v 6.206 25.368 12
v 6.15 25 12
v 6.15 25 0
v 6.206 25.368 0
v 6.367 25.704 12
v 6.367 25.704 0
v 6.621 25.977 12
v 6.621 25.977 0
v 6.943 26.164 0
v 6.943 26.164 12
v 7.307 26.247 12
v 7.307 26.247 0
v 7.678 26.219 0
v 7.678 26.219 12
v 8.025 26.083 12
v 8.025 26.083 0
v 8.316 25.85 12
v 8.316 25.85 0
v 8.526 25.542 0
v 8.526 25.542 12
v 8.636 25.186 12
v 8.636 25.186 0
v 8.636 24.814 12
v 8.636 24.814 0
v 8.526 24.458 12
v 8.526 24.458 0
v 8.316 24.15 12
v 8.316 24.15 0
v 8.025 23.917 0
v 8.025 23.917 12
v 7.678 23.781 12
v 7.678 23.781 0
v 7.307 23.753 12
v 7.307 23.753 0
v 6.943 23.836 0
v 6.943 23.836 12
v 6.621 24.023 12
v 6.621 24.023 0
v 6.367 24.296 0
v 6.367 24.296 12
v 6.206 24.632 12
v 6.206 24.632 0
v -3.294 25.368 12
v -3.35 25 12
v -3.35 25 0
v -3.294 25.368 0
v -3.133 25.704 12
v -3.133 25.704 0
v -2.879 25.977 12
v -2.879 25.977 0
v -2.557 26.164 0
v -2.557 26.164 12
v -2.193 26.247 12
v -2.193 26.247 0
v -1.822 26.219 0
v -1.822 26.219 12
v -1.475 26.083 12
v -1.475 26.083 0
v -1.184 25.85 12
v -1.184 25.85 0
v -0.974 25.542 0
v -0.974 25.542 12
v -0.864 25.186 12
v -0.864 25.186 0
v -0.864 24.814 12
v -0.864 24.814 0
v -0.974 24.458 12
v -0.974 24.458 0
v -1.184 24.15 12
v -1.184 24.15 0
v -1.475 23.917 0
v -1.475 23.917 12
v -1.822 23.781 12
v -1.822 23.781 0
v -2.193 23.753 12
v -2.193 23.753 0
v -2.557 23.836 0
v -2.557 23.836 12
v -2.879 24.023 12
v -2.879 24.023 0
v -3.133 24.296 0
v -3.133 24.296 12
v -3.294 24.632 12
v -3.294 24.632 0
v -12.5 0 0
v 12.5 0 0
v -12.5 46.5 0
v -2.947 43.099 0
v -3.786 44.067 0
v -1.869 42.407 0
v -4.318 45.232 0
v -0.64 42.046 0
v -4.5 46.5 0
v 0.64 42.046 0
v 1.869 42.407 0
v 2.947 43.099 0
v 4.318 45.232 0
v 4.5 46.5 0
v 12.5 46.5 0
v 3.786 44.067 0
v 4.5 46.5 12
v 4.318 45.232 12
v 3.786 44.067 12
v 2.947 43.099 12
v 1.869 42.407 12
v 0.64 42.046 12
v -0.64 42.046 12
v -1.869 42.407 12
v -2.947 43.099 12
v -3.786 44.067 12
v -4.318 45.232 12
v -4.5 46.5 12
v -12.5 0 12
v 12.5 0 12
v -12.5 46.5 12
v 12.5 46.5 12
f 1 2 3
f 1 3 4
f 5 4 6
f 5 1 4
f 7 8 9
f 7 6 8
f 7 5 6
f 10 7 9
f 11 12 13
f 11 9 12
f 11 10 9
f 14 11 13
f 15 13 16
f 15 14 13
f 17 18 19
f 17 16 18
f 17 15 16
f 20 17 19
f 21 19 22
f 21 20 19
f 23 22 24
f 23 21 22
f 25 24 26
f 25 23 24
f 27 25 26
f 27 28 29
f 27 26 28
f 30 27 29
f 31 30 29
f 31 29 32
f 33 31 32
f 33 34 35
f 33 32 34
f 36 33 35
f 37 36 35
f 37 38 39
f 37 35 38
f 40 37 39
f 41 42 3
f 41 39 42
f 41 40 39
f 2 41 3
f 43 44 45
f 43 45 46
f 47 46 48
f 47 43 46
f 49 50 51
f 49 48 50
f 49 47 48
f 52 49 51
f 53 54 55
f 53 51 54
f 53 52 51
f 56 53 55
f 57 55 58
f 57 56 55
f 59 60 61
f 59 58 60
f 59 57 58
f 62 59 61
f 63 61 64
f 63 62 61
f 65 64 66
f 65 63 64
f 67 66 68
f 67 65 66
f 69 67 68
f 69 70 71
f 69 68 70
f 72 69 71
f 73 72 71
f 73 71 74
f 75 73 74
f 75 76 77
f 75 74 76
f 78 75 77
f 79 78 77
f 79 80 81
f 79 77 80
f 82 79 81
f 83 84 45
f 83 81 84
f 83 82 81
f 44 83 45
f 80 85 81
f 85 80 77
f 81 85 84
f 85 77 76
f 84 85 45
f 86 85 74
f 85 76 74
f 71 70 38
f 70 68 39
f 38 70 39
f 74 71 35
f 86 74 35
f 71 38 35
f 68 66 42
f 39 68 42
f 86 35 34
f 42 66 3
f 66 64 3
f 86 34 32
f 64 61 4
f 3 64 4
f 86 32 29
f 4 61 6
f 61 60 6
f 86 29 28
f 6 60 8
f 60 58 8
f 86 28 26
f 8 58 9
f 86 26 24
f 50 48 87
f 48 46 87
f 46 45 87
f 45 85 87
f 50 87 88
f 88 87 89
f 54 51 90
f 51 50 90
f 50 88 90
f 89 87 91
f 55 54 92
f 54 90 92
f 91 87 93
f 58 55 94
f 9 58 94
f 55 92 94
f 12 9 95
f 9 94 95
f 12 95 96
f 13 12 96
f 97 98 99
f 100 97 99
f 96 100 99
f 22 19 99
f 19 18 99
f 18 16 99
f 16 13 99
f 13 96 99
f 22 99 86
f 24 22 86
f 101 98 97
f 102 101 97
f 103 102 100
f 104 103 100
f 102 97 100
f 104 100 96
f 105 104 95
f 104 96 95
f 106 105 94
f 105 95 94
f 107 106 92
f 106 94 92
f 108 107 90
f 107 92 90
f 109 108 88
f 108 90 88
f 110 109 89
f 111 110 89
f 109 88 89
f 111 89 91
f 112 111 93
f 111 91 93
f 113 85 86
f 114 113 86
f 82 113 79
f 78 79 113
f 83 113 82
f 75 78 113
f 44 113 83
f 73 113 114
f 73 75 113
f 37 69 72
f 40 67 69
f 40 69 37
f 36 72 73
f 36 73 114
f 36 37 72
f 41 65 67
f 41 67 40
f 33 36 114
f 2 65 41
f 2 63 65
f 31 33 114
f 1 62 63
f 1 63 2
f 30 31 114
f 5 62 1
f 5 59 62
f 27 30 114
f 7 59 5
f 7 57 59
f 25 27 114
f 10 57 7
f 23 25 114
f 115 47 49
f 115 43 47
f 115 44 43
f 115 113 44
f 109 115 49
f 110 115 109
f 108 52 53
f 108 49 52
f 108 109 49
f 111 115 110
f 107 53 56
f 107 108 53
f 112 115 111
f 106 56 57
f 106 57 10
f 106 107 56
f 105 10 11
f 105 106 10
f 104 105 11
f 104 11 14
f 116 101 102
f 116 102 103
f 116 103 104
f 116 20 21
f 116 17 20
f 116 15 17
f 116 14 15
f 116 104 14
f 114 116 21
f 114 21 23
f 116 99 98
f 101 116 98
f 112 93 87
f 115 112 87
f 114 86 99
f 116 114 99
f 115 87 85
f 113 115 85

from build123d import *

# Parameters (mm, degrees)
BOSS_EXTRUDE1_DEPTH     = 12
CUT_EXTRUDE1_DEPTH      = 50.623583103
CUT_EXTRUDE1_DEPTH_BACK = 50.623583103
SKETCH2_R               = 1.25


with BuildPart() as part:
    # Sketch1 → Boss-Extrude1 (new body)
    with BuildSketch(Plane.XY):
        with BuildLine():
            Line((-12.5, 0), (12.5, 0))
            Line((12.5, 0), (12.5, 46.5))
            Line((12.5, 46.5), (4.5, 46.5))
            ThreePointArc((4.5, 46.5), (0, 42), (-4.5, 46.5))
            Line((-4.5, 46.5), (-12.5, 46.5))
            Line((-12.5, 46.5), (-12.5, 0))
        make_face()
    extrude(amount=BOSS_EXTRUDE1_DEPTH)

    # Sketch2 → Cut-Extrude1 (cut, two sides: drawn at the far end of the back side and taken through both)
    with BuildSketch(Plane(origin=(0, 0, 0), x_dir=(-1, 0, 0), z_dir=(0, 0, -1)).offset(-CUT_EXTRUDE1_DEPTH_BACK)):
        with Locations((-7.4, 25)):
            Circle(SKETCH2_R)
        with Locations((2.1, 25)):
            Circle(SKETCH2_R)
    extrude(amount=CUT_EXTRUDE1_DEPTH + CUT_EXTRUDE1_DEPTH_BACK, mode=Mode.SUBTRACT)


solid = part.part
